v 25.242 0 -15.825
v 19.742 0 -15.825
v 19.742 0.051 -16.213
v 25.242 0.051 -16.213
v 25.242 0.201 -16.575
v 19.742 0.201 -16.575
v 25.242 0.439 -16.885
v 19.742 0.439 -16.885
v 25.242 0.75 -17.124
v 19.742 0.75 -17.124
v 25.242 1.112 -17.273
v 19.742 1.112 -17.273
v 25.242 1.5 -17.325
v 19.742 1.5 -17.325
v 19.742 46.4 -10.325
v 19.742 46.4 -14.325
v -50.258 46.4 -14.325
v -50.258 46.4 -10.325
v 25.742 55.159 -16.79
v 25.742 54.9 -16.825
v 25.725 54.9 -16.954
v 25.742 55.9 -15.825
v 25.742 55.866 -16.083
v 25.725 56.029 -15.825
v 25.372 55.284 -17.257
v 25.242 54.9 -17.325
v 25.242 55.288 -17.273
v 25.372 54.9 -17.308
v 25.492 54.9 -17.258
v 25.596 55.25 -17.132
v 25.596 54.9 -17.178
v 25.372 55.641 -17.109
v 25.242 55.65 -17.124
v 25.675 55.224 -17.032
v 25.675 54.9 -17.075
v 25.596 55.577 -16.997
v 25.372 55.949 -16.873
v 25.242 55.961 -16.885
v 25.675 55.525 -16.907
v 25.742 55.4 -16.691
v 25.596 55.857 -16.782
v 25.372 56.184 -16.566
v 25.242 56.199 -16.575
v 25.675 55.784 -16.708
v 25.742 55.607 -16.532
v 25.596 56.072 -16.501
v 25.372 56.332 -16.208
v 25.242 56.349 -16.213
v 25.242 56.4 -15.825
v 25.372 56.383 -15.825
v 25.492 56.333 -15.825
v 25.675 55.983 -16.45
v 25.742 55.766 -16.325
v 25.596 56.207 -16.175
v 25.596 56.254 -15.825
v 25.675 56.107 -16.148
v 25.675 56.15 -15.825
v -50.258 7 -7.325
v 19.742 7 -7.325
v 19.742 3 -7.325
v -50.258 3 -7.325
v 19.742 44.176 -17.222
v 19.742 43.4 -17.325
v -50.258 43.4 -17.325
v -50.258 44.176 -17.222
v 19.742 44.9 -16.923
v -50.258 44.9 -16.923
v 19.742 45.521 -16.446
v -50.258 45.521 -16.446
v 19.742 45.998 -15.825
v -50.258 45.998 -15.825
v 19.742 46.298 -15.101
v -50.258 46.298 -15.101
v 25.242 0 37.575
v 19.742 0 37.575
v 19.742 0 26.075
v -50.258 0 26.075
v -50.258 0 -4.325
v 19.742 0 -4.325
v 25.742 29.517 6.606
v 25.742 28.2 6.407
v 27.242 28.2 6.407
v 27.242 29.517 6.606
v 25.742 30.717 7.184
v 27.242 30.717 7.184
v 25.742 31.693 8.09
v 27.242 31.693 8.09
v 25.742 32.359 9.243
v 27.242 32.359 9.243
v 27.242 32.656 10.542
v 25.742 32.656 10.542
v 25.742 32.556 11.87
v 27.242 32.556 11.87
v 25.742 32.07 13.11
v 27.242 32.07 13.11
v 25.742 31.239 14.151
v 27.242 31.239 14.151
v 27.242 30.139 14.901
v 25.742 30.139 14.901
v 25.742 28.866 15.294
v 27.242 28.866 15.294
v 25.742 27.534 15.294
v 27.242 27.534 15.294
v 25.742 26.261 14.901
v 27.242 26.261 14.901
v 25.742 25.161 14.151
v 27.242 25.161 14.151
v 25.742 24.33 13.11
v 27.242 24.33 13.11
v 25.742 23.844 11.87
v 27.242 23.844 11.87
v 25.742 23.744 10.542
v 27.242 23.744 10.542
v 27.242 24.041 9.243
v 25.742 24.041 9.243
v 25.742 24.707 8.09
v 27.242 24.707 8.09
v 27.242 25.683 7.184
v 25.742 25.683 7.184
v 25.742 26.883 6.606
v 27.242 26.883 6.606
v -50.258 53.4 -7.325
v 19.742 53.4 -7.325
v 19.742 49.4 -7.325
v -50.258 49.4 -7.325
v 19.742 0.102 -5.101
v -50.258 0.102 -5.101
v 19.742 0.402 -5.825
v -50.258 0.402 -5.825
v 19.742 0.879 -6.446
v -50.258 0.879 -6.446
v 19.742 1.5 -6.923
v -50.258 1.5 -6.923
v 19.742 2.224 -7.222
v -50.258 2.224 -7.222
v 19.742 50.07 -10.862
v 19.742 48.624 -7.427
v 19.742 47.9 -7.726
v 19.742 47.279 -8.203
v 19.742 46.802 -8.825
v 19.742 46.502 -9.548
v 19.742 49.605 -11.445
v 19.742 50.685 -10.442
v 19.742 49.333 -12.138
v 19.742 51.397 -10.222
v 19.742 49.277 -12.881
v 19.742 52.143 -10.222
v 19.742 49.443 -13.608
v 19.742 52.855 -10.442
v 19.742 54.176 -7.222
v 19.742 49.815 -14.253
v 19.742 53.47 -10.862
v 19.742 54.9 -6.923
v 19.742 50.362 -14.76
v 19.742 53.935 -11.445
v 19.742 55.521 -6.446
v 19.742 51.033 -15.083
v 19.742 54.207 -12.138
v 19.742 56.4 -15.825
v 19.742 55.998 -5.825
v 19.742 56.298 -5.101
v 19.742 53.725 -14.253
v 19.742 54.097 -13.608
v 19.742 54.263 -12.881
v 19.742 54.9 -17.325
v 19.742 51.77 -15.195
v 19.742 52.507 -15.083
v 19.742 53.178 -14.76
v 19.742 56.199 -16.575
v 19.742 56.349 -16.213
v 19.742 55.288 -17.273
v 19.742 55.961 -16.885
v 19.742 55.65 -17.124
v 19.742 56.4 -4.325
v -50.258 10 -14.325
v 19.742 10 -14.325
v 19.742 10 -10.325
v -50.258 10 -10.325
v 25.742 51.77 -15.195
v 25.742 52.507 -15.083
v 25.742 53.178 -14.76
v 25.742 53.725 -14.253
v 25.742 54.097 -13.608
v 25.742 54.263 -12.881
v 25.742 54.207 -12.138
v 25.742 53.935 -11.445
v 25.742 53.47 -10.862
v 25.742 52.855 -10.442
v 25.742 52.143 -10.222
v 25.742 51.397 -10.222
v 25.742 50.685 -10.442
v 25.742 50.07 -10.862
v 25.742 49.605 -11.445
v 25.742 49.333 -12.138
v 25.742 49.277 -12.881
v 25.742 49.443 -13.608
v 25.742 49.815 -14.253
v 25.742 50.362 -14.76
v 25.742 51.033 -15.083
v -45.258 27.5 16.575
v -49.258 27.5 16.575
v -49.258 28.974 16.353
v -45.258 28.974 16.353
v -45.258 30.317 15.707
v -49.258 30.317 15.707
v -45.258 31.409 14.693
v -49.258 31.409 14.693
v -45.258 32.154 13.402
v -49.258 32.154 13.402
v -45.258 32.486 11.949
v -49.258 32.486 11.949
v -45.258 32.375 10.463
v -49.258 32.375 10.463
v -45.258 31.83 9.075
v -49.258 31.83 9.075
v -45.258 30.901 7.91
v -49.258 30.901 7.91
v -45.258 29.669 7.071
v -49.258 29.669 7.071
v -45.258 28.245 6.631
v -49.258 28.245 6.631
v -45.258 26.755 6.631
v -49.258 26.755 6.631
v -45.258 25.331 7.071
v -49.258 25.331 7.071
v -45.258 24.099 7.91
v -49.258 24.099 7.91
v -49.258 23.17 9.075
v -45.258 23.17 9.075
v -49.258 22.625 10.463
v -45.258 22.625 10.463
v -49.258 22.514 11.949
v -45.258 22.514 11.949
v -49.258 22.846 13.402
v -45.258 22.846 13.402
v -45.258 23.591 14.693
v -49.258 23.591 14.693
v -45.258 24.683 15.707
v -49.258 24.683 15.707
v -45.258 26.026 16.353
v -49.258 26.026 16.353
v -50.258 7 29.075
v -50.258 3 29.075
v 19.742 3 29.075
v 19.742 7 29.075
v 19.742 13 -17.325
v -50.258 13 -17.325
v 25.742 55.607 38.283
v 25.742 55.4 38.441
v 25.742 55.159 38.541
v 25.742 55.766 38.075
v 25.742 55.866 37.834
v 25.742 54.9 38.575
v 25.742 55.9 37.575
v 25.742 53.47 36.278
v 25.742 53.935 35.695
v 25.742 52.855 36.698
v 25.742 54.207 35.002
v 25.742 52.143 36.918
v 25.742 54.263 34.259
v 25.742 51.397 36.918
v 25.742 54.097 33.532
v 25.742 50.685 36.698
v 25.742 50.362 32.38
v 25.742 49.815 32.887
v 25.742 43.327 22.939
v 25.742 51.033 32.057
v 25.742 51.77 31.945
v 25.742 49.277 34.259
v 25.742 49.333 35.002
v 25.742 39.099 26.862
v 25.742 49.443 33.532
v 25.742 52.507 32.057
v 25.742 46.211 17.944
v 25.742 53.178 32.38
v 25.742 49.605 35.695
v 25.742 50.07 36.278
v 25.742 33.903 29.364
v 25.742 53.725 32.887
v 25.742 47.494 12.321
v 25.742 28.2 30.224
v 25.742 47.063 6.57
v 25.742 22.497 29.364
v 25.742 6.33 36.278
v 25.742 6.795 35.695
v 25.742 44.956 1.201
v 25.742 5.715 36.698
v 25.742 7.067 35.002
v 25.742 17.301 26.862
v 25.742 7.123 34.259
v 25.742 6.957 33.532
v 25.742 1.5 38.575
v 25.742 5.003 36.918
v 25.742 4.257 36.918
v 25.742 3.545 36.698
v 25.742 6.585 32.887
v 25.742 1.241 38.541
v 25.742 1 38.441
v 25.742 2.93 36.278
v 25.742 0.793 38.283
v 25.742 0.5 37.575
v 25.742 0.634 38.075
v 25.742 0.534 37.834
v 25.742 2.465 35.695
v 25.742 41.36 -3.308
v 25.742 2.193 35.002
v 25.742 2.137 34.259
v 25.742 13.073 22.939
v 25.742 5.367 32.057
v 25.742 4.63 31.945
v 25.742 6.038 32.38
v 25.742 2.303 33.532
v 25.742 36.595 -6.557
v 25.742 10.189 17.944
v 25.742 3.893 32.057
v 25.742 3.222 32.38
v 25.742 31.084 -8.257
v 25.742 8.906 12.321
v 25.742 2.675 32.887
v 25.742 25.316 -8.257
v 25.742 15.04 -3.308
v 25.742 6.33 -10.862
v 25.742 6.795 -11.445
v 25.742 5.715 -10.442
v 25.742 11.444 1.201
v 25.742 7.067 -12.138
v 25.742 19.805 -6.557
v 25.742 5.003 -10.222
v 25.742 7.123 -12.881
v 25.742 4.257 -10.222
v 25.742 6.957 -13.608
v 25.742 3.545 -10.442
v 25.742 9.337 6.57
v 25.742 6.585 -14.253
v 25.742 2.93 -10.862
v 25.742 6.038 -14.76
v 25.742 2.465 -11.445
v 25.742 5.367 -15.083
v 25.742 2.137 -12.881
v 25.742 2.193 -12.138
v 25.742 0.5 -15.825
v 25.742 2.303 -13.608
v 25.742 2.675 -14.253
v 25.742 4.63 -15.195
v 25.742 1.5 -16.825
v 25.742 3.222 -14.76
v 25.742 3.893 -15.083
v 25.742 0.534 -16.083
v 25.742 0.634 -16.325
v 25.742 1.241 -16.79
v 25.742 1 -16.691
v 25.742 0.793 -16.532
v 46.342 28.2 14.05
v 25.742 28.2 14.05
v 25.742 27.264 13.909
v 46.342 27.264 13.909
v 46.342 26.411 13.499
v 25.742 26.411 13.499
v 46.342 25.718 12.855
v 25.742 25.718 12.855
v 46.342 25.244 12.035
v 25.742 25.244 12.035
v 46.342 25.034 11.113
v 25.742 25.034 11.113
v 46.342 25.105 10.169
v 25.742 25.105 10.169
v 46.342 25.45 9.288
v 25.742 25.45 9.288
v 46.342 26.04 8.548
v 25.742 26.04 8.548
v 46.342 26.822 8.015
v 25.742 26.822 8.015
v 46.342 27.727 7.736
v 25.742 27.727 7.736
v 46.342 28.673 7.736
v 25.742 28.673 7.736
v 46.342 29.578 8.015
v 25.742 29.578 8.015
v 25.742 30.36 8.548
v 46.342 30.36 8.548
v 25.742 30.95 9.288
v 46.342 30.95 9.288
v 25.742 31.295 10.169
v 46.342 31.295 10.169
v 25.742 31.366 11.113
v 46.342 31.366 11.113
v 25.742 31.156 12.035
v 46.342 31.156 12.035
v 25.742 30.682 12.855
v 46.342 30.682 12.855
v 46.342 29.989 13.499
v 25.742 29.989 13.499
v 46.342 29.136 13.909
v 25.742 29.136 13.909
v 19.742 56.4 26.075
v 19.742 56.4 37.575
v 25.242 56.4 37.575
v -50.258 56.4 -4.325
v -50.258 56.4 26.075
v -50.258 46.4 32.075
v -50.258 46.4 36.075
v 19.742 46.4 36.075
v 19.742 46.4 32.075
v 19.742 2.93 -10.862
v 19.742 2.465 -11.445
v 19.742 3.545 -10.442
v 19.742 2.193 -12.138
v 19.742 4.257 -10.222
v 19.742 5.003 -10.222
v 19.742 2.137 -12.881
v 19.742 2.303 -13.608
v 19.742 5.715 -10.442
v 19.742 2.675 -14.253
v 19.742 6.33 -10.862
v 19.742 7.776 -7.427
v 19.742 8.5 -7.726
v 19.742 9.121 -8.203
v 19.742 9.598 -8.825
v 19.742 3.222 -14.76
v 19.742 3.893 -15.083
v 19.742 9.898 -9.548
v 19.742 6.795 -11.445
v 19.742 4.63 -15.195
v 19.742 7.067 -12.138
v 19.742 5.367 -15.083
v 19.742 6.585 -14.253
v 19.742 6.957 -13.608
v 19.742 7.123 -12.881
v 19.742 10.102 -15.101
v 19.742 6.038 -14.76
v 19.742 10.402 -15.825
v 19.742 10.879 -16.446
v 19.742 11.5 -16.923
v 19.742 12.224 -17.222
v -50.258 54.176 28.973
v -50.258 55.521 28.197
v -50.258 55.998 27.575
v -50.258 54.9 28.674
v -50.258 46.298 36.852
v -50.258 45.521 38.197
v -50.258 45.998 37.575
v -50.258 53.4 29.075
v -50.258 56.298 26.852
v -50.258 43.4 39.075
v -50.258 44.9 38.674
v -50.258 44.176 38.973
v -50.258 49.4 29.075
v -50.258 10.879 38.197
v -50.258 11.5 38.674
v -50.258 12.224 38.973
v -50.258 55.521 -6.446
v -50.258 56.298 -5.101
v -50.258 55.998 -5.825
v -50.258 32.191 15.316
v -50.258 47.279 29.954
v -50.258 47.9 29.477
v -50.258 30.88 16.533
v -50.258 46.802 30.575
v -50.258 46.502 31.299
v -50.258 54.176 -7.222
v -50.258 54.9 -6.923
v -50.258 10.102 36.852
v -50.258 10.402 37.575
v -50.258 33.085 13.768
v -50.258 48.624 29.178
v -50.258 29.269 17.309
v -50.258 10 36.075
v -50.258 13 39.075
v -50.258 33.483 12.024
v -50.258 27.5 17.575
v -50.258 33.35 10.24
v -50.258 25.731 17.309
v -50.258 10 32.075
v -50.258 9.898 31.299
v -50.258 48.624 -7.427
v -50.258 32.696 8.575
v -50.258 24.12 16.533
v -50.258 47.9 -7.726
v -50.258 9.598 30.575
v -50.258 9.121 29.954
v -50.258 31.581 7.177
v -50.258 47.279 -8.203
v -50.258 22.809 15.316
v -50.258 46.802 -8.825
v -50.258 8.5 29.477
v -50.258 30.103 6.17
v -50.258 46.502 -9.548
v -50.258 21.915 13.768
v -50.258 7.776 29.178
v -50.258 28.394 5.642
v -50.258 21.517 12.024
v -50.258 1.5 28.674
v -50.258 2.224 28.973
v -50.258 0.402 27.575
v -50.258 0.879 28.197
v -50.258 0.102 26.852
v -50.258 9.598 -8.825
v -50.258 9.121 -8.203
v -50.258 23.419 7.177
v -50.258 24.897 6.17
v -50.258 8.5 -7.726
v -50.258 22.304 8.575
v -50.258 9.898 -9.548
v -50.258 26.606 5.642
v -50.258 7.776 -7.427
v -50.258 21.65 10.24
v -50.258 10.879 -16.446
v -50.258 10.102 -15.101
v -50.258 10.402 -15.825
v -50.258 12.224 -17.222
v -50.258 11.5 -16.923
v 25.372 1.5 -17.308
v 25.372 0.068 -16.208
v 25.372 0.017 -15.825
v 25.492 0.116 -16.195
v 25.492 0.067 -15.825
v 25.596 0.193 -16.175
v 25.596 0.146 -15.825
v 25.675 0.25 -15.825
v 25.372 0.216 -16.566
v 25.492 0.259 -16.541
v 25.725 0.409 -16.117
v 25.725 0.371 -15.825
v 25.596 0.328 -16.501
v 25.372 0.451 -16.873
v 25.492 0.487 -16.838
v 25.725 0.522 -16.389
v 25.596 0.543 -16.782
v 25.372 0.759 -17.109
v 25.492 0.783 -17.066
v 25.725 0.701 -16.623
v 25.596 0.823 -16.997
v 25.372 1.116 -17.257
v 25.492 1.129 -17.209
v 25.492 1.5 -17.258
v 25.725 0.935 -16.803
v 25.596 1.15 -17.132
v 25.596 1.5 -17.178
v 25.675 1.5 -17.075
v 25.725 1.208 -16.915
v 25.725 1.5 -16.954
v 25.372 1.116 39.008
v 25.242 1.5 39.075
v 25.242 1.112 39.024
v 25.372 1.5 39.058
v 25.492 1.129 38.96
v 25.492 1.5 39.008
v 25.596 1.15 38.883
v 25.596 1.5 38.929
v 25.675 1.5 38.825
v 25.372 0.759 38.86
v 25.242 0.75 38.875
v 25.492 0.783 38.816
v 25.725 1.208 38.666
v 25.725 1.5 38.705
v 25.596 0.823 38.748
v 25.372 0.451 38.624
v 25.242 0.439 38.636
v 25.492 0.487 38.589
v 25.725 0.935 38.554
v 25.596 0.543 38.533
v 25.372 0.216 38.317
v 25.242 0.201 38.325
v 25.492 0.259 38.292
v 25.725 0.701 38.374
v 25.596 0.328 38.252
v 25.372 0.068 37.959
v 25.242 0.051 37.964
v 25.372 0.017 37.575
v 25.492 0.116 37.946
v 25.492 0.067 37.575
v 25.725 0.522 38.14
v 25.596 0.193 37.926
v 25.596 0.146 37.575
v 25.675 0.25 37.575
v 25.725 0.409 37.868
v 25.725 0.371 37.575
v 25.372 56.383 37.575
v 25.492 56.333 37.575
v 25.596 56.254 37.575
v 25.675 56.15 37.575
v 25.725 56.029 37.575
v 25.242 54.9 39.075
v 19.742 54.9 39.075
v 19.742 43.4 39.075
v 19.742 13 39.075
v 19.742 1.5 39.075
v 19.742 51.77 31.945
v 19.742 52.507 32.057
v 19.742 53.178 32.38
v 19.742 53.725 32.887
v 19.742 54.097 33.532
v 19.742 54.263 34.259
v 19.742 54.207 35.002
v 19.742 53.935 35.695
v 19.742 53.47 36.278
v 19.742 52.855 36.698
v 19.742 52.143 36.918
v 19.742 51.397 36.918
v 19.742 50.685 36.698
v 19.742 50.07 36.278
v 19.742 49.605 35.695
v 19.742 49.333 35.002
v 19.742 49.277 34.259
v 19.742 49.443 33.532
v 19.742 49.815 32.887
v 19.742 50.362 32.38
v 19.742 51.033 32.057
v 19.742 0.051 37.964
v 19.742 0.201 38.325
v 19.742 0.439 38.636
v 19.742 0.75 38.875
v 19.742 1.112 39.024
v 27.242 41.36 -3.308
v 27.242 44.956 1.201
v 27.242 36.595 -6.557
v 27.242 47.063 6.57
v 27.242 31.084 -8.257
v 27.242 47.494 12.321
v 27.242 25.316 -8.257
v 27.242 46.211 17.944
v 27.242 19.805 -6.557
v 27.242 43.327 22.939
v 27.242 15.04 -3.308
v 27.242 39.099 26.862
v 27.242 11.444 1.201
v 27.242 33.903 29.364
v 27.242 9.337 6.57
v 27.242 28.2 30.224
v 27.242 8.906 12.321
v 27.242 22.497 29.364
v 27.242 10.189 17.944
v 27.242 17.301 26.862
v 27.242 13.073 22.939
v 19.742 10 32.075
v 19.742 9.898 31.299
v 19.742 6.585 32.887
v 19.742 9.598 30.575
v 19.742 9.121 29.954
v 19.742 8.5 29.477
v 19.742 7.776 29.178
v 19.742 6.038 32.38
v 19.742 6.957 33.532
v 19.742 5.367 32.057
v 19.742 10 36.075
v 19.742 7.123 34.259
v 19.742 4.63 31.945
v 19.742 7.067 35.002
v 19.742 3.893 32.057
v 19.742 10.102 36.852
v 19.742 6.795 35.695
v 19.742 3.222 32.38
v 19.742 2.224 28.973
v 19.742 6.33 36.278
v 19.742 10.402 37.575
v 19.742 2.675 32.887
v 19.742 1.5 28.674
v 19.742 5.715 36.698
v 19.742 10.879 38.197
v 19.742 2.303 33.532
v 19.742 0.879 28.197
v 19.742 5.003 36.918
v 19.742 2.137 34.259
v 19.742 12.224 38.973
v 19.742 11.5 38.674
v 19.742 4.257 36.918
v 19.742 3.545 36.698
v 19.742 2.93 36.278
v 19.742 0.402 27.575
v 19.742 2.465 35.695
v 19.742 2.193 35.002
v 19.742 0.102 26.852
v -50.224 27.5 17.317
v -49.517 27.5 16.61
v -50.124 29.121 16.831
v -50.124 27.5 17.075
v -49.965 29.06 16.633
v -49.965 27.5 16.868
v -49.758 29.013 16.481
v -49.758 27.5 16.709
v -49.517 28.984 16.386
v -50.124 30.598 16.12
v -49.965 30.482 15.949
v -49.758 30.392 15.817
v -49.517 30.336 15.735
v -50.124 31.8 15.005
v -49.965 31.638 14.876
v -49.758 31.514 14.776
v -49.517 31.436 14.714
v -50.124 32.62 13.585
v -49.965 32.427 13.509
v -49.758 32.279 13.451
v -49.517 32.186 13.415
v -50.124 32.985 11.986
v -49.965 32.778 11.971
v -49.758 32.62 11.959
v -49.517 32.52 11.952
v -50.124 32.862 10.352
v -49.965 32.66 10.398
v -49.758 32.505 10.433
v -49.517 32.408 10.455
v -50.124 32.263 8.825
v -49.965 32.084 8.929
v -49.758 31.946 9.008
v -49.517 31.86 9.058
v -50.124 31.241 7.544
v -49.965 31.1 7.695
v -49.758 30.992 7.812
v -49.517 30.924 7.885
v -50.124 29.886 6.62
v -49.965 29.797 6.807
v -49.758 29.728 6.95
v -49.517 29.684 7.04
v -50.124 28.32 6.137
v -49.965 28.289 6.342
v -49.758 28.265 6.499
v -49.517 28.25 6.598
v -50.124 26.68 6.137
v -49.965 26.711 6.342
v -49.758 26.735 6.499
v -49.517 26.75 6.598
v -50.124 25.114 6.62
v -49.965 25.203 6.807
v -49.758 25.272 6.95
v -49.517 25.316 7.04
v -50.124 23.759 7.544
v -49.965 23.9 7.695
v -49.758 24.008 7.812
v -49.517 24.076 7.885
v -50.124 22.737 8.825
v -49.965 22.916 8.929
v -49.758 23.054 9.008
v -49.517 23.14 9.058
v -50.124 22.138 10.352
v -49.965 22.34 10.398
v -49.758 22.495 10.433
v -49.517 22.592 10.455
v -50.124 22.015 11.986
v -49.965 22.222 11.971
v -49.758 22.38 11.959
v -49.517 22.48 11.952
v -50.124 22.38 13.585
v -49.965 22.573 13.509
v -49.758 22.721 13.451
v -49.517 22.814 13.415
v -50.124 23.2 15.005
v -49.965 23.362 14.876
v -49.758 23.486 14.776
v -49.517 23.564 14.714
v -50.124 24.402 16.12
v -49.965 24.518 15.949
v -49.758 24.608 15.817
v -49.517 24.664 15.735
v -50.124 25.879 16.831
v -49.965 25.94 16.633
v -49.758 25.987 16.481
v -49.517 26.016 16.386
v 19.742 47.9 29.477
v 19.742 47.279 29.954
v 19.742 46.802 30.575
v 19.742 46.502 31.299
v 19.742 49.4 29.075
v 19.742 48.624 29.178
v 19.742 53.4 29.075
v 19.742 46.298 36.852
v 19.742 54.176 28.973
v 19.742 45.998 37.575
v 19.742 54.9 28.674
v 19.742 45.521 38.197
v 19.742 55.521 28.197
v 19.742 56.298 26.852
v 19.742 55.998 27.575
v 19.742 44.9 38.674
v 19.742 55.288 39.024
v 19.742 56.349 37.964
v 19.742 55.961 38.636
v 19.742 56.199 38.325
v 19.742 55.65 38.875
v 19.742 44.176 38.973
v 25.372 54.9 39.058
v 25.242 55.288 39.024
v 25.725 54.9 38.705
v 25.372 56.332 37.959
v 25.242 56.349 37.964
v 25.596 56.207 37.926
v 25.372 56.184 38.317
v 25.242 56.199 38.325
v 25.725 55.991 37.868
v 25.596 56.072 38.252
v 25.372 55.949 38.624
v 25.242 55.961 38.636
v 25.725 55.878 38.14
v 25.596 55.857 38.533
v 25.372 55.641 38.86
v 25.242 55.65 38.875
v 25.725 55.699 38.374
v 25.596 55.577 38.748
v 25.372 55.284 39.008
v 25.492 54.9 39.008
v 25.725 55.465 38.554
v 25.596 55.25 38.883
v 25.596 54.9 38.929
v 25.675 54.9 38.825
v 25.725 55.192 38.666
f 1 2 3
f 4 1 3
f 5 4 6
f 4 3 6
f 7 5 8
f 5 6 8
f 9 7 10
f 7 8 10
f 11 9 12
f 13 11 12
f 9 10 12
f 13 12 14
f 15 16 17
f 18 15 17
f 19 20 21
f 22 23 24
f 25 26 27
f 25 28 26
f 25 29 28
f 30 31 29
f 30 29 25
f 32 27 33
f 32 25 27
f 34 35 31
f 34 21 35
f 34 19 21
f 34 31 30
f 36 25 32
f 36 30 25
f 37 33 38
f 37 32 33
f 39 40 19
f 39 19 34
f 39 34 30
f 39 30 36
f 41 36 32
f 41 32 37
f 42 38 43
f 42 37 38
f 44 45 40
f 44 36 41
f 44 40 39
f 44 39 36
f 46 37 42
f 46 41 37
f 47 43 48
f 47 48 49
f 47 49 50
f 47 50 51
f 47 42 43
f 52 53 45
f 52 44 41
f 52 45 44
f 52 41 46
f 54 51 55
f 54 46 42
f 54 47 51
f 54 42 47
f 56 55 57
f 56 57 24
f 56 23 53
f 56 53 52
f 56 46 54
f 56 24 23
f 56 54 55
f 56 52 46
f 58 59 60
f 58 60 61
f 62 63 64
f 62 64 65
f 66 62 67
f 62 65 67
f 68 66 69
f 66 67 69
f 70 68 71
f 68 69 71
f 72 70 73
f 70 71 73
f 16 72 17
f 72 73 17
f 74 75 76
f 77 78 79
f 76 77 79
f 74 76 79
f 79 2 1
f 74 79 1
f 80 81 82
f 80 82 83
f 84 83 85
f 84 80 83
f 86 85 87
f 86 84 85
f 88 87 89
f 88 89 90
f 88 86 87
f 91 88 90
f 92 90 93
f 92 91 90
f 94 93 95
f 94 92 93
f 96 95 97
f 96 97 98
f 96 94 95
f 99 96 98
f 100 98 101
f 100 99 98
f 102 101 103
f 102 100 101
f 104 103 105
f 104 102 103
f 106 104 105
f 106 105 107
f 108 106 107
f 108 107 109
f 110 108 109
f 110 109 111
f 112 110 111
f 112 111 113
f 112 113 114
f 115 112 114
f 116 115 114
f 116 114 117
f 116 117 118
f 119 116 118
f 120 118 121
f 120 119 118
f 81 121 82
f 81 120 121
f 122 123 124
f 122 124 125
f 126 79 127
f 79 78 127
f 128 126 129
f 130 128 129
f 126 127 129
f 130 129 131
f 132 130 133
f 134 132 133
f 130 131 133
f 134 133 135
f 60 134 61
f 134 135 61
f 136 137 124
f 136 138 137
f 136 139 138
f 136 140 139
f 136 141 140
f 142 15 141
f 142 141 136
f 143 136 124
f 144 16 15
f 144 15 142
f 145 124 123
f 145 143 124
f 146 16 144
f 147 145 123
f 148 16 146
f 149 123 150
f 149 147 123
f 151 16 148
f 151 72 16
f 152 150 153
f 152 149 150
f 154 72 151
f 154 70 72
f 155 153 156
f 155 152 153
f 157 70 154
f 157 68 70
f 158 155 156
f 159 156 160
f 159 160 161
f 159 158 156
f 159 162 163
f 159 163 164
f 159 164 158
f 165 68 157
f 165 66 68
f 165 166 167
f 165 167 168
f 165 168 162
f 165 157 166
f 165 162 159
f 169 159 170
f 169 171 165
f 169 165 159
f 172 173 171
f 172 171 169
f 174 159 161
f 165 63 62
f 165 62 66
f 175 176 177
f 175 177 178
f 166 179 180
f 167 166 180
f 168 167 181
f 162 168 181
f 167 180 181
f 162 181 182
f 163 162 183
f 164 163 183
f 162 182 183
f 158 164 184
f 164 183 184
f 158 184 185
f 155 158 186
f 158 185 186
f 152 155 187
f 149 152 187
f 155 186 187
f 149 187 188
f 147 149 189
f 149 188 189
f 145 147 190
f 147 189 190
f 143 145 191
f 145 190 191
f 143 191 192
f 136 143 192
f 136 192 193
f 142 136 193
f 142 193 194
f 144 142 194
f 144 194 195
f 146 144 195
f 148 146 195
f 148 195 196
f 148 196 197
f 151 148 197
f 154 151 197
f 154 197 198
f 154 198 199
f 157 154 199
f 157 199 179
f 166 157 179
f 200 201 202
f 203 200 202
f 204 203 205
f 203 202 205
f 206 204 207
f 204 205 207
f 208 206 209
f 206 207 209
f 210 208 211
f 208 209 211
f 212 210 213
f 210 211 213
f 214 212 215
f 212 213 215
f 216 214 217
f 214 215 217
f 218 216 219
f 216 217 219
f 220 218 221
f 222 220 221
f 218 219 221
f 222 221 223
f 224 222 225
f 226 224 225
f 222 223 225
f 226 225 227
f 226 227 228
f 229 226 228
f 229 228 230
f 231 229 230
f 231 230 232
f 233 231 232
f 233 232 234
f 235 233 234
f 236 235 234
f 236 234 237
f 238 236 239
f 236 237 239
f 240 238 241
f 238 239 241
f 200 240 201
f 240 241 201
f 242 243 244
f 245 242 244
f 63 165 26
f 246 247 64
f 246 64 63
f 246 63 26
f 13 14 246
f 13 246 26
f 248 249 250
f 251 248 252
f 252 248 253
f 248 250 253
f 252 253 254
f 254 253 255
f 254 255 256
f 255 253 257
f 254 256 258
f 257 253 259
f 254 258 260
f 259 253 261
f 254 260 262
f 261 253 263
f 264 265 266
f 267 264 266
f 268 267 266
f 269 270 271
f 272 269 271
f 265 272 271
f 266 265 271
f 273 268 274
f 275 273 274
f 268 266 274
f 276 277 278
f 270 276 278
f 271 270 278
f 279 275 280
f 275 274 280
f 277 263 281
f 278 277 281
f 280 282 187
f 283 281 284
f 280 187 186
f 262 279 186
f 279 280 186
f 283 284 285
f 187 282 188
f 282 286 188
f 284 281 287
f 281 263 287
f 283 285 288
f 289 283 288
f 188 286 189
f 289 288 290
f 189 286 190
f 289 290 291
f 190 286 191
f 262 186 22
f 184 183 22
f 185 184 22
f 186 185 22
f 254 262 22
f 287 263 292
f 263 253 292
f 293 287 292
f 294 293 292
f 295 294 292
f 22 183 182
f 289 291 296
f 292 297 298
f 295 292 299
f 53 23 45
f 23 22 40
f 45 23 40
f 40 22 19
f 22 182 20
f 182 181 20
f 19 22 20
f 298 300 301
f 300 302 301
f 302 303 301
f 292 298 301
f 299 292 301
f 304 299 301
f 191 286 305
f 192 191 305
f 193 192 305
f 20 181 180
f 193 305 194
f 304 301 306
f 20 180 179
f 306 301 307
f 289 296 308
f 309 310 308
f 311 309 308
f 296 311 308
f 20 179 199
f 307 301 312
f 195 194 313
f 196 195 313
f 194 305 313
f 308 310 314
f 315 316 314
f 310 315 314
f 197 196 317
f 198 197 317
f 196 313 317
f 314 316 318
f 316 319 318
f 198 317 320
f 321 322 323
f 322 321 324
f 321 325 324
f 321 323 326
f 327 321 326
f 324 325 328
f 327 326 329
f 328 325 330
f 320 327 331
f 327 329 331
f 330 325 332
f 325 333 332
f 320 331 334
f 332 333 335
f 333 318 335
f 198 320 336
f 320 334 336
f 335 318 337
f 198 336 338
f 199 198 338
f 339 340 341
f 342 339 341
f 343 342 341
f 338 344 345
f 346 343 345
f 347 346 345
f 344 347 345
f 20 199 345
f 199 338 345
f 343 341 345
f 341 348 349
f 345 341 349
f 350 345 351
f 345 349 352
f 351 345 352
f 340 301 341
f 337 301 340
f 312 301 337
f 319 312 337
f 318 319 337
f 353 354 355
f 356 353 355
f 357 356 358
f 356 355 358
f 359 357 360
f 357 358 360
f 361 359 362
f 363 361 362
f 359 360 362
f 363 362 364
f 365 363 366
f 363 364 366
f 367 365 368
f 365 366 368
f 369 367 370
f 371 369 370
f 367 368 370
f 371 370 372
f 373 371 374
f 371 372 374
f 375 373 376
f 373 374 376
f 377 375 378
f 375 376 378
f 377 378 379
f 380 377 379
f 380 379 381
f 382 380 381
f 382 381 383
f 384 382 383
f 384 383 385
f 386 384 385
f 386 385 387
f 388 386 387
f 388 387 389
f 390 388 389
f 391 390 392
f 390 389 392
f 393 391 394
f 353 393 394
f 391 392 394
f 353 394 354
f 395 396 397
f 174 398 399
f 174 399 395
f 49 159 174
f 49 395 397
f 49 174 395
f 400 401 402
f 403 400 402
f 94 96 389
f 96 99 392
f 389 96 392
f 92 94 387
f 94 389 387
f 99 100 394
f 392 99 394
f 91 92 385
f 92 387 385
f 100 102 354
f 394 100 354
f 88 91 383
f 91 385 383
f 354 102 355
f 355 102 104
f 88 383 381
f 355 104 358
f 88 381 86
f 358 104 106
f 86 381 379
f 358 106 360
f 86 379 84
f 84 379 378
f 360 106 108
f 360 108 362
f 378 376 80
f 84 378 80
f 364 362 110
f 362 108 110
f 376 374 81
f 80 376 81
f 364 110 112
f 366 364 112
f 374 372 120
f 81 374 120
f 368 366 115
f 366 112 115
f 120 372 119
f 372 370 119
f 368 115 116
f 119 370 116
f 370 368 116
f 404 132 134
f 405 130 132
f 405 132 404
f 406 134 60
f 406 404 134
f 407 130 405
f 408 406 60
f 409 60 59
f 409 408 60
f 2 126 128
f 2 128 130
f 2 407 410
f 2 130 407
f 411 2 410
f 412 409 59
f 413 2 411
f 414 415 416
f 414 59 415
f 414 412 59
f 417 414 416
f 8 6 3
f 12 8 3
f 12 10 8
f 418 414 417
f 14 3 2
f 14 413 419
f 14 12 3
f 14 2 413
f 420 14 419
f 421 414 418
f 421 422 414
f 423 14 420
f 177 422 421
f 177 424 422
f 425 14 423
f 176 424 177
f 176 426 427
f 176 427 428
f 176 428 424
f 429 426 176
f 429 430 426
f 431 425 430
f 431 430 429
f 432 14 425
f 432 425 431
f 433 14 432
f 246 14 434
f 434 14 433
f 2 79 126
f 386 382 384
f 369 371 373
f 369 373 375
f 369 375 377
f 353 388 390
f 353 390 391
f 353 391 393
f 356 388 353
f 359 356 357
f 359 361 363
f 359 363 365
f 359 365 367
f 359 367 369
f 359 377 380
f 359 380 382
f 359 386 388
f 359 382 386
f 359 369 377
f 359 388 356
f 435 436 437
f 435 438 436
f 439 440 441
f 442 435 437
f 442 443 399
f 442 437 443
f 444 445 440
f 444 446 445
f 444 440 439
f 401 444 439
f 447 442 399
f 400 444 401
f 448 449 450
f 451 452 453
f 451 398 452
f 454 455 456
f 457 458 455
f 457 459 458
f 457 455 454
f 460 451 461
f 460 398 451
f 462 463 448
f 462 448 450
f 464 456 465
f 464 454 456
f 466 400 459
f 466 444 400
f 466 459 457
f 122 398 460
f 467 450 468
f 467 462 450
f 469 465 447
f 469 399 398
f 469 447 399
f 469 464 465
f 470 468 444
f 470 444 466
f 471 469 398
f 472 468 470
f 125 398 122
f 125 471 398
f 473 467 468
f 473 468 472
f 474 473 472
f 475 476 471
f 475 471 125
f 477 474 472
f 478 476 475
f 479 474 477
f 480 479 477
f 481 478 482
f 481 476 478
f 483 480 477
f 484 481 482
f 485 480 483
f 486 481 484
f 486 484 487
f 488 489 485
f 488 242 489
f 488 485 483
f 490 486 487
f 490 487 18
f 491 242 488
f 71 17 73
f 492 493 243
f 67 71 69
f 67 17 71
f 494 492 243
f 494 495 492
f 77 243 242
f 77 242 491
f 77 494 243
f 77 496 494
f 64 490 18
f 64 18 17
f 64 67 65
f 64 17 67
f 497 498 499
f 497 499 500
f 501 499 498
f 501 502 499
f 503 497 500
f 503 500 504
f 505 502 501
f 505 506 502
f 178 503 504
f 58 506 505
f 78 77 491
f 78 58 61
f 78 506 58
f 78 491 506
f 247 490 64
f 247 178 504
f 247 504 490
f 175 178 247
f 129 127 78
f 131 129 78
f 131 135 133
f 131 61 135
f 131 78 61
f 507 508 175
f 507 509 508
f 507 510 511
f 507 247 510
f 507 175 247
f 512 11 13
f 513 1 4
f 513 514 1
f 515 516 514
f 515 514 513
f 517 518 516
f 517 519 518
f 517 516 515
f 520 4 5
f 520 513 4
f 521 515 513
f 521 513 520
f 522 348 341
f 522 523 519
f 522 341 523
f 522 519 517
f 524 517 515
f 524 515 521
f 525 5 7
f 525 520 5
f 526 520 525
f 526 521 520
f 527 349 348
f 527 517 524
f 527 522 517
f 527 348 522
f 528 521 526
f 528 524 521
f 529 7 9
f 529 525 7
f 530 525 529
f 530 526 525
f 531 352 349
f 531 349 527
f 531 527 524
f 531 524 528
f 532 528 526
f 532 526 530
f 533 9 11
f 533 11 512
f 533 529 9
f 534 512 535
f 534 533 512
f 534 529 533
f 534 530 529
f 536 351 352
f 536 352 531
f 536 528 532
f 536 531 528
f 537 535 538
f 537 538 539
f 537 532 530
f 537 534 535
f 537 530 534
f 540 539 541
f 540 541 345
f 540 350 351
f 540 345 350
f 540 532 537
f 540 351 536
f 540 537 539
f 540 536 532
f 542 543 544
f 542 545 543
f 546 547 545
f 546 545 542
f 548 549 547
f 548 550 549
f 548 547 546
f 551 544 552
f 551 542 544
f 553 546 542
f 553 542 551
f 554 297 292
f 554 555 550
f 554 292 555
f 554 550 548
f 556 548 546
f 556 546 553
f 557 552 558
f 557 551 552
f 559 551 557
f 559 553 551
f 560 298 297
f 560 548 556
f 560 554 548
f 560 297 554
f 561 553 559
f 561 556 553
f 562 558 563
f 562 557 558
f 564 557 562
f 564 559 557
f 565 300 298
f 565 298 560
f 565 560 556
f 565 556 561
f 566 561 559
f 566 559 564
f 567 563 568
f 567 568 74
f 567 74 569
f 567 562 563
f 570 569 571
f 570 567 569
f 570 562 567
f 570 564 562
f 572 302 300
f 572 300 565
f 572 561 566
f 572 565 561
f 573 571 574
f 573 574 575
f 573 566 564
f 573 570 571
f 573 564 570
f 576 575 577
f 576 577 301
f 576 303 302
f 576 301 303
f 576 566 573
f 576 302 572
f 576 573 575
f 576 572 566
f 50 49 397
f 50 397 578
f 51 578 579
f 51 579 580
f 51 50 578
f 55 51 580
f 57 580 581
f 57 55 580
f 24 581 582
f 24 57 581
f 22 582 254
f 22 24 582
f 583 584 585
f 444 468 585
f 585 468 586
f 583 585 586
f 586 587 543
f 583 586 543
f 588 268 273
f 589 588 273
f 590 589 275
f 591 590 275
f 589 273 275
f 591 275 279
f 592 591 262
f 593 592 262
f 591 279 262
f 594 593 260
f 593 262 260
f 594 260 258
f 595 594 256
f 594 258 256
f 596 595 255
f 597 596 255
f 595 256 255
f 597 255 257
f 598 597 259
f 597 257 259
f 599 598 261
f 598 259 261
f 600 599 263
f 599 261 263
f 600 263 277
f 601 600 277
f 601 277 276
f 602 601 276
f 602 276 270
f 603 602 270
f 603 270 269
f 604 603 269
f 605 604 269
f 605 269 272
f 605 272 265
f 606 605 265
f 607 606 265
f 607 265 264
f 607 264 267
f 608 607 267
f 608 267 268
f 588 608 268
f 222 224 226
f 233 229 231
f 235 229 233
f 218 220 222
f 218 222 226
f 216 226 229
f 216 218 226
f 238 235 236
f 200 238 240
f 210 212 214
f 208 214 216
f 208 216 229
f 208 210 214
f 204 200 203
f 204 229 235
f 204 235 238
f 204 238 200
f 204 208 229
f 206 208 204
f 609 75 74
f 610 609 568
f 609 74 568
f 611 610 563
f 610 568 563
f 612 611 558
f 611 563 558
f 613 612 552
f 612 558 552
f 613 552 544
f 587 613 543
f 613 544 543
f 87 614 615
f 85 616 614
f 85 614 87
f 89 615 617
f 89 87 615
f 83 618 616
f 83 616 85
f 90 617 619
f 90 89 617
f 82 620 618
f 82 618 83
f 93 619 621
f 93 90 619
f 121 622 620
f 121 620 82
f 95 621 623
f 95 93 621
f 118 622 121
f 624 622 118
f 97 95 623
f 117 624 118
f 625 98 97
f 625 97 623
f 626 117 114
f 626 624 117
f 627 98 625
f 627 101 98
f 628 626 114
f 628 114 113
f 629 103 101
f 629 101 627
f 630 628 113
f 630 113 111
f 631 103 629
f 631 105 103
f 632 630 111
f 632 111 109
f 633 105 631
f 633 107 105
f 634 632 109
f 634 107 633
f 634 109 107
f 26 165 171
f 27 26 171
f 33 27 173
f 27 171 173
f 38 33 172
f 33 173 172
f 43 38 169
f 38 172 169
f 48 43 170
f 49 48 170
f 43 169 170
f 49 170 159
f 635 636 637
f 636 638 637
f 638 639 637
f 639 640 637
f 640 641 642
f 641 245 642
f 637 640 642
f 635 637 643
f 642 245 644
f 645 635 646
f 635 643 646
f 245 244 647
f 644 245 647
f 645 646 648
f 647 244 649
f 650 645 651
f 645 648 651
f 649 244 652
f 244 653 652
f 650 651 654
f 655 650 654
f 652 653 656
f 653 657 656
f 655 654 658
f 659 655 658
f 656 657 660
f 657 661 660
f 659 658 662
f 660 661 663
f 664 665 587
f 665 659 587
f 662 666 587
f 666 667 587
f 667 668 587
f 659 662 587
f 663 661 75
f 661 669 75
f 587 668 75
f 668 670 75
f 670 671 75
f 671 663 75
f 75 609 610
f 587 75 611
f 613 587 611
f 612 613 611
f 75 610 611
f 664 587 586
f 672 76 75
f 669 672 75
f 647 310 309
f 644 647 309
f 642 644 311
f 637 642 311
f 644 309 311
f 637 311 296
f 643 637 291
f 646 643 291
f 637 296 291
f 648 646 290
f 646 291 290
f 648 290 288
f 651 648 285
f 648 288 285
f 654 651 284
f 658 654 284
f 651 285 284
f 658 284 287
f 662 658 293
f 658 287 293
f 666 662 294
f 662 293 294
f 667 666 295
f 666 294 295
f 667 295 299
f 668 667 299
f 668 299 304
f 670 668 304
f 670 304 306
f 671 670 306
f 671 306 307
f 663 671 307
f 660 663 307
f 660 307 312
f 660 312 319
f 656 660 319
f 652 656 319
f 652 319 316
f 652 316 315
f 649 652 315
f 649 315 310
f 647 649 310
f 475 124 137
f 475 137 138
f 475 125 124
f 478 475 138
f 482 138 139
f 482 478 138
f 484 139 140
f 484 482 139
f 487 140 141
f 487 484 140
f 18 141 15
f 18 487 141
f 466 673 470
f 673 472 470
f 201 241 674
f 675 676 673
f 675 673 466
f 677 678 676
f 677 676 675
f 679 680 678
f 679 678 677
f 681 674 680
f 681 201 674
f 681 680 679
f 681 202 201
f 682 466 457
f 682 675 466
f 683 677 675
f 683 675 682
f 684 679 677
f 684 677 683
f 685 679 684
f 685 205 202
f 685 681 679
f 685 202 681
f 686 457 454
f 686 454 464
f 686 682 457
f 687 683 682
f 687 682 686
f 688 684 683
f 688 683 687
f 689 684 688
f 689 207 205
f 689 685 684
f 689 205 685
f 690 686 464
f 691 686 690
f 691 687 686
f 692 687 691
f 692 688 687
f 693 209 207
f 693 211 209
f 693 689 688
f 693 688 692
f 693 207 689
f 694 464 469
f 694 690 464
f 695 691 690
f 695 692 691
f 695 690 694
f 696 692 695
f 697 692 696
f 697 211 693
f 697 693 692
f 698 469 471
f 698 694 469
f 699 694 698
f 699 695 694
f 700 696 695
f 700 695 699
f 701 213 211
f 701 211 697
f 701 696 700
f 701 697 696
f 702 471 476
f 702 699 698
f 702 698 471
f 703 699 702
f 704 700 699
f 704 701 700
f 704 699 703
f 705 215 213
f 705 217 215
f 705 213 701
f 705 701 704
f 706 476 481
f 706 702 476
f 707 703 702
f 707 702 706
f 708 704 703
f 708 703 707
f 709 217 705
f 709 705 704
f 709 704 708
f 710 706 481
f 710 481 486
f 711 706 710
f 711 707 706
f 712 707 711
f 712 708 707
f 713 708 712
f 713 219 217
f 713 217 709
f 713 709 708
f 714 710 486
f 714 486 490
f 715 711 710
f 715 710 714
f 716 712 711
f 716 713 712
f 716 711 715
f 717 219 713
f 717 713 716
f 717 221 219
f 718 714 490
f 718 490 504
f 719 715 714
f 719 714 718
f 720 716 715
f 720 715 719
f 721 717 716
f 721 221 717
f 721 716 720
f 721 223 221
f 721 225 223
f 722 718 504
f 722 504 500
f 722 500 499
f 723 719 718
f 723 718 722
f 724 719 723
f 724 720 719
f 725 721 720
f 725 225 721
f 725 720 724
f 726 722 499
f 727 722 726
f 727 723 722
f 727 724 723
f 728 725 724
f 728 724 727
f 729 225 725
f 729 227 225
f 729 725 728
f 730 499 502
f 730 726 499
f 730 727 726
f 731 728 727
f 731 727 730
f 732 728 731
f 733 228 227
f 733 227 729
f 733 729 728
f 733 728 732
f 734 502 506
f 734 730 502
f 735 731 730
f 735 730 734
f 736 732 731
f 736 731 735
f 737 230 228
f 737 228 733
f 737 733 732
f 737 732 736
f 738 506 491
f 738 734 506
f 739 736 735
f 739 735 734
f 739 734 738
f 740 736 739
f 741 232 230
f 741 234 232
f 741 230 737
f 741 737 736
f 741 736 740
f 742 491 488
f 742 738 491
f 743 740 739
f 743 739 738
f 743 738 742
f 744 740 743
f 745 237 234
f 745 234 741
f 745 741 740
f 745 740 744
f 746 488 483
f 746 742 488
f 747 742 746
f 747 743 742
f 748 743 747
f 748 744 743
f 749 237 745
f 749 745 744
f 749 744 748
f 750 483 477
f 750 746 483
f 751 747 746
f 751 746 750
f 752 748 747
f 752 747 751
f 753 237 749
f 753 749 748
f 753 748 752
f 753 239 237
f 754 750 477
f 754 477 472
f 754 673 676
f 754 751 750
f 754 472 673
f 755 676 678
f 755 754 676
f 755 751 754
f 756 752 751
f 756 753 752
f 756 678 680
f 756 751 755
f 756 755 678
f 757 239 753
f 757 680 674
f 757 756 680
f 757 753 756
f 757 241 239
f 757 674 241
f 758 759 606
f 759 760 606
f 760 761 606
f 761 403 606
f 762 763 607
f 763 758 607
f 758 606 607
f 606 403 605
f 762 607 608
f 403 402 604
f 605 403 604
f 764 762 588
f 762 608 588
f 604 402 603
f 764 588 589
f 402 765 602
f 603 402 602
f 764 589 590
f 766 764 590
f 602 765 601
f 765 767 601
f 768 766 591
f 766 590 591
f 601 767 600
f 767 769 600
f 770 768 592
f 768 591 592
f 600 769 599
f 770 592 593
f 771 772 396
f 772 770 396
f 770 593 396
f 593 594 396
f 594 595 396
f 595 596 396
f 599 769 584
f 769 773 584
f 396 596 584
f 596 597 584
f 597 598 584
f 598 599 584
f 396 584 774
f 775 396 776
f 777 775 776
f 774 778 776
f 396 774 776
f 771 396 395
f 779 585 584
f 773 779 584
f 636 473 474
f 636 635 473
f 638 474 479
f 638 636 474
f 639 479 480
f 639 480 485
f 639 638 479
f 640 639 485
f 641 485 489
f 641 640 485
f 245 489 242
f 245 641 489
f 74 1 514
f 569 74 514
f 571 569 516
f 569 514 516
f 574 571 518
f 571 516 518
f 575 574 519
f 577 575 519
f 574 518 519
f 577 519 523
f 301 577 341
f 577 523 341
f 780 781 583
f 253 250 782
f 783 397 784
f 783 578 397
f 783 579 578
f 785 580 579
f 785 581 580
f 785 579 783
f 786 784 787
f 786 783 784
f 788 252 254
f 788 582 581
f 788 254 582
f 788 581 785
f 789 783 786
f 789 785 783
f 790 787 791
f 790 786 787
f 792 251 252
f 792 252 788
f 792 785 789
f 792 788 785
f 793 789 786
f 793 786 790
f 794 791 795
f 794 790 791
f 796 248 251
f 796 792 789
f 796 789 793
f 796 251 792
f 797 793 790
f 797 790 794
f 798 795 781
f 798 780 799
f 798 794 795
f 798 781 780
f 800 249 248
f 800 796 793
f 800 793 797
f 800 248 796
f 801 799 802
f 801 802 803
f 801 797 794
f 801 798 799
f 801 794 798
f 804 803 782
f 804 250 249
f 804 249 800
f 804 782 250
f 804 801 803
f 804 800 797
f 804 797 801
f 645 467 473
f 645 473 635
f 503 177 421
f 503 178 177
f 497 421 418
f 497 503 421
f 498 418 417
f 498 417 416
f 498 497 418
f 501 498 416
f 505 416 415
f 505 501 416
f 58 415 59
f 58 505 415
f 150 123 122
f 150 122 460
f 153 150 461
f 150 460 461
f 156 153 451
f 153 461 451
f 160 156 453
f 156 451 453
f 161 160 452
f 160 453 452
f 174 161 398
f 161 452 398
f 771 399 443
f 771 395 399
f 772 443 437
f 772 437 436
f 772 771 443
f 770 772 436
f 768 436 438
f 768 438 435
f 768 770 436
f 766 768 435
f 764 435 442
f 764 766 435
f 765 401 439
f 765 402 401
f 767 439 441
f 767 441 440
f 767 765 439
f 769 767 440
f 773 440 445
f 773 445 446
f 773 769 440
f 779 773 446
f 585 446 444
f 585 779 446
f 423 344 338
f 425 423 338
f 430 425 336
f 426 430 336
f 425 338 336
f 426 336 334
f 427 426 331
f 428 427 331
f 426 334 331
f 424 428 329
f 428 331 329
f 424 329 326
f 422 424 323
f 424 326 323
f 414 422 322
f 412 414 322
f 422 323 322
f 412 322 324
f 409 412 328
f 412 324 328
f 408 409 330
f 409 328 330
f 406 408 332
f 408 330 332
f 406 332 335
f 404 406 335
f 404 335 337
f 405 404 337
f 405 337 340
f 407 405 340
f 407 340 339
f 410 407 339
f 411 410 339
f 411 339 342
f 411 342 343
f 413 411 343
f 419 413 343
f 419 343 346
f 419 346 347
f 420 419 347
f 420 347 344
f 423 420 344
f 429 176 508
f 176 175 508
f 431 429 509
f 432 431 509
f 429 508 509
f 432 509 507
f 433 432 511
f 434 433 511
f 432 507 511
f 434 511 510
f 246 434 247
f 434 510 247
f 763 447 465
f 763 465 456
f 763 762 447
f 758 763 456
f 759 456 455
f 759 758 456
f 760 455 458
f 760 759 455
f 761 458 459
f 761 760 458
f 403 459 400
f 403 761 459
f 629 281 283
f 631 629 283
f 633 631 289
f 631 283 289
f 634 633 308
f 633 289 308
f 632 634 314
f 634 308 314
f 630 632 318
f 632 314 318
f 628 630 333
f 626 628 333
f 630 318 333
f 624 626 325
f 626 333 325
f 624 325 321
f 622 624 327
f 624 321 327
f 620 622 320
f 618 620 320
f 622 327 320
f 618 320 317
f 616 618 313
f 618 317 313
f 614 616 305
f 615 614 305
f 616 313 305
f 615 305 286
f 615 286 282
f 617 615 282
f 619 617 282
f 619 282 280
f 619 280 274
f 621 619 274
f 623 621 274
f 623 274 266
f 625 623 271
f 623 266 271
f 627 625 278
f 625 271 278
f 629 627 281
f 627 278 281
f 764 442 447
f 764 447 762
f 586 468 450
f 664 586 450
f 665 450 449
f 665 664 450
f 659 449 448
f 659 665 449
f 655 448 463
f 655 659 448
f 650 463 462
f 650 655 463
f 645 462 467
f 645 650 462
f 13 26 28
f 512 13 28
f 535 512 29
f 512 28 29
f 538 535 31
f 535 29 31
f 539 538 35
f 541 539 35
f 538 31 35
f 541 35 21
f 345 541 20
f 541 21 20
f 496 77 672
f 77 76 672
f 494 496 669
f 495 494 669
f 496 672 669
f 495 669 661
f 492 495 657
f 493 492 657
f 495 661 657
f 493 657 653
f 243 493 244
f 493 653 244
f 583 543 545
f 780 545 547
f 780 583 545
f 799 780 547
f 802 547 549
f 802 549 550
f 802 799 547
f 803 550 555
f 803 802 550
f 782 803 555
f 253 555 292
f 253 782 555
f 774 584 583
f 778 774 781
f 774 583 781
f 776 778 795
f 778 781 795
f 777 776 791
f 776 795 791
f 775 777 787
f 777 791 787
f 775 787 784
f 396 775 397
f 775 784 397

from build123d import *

# Parameters (mm, degrees)
SKETCH1_W           = 76
SKETCH1_H           = 56.4
BOSS_EXTRUDE1_DEPTH = 56.4
SKETCH2_W           = 70
SKETCH2_H           = 10
CUT_EXTRUDE1_DEPTH  = 10
SKETCH3_W           = 70
SKETCH3_H           = 10
CUT_EXTRUDE4_DEPTH  = 10
SKETCH5_W           = 70
SKETCH5_H           = 10
CUT_EXTRUDE5_DEPTH  = 10
FILLET2_R           = 3
FILLET3_R           = 3
SKETCH7_R           = 5
CUT_EXTRUDE6_DEPTH  = 5
FILLET4_R           = 1
FILLET5_R           = 0.5
FILLET6_R           = 1.5
FILLET7_R           = 1.5
SKETCH18_R          = 2.5
CUT_EXTRUDE7_DEPTH  = 10
SKETCH20_R          = 3.175
BOSS_EXTRUDE2_DEPTH = 20.6
SKETCH21_R          = 19.348505468
SKETCH21_R_2        = 4.468295999
BOSS_EXTRUDE3_DEPTH = 1.5


with BuildPart() as part:
    # Sketch1 → Boss-Extrude1 (new body)
    with BuildSketch(Plane(origin=(0, 0, 0), x_dir=(1, 0, 0), z_dir=(0, 1, 0))):
        with Locations((-12.257828935, -10.875461997)):
            Rectangle(SKETCH1_W, SKETCH1_H)
    extrude(amount=BOSS_EXTRUDE1_DEPTH)

    # Sketch2 → Cut-Extrude1 (cut)
    with BuildSketch(Plane.XY.offset(39.075461997)):
        with Locations((-15.257828935, 51.4)):
            Rectangle(SKETCH2_W, SKETCH2_H)
    extrude(amount=-CUT_EXTRUDE1_DEPTH, mode=Mode.SUBTRACT)

    # Sketch3 → Cut-Extrude4 (cut)
    with BuildSketch(Plane(origin=(0, 0, -17.324538003), x_dir=(-1, 0, 0), z_dir=(0, 0, -1))):
        with Locations((15.257828935, 51.4)):
            Rectangle(SKETCH3_W, SKETCH3_H)
        with Locations((15.257828935, 5)):
            Rectangle(SKETCH3_W, SKETCH3_H)
    extrude(amount=-CUT_EXTRUDE4_DEPTH, mode=Mode.SUBTRACT)

    # Sketch5 → Cut-Extrude5 (cut)
    with BuildSketch(Plane.XZ):
        with Locations((-15.257828935, 34.075461997)):
            Rectangle(SKETCH5_W, SKETCH5_H)
    extrude(amount=-CUT_EXTRUDE5_DEPTH, mode=Mode.SUBTRACT)

    # Fillet2
    fillet2_edges = [part.edges().sort_by_distance(p)[0] for p in [
        (-15.257828935, 56.4, 29.075461997),
        (-15.257828935, 46.4, 39.075461997),
        (-15.257828935, 0, -7.324538003),
        (-15.257828935, 10, -17.324538003),
        (-15.257828935, 56.4, -7.324538003),
        (-15.257828935, 46.4, -17.324538003),
        (-15.257828935, 10, 39.075461997),
        (-15.257828935, 0, 29.075461997),
    ]]
    fillet(fillet2_edges, radius=FILLET2_R)

    # Fillet3
    fillet3_edges = [part.edges().sort_by_distance(p)[0] for p in [
        (-15.257828935, 46.4, 29.075461997),
        (-15.257828935, 10, -7.324538003),
        (-15.257828935, 46.4, -7.324538003),
        (-15.257828935, 10, 29.075461997),
    ]]
    fillet(fillet3_edges, radius=FILLET3_R)

    # Sketch7 → Cut-Extrude6 (cut)
    with BuildSketch(Plane.ZY.offset(50.257828935)):
        with Locations((11.575461997, 27.5)):
            Circle(SKETCH7_R)
    extrude(amount=-CUT_EXTRUDE6_DEPTH, mode=Mode.SUBTRACT)

    # Fillet4
    fillet4_edges = [part.edges().sort_by_distance(p)[0] for p in [
        (-50.257828935, 27.5, 6.575461997),
    ]]
    fillet(fillet4_edges, radius=FILLET4_R)

    # Fillet5
    fillet5_edges = [part.edges().sort_by_distance(p)[0] for p in [
        (25.742171065, 56.4, 10.875461997),
        (25.742171065, 0, 10.875461997),
        (25.742171065, 28.2, -17.324538003),
        (25.742171065, 28.2, 39.075461997),
    ]]
    fillet(fillet5_edges, radius=FILLET5_R)

    # Fillet6
    # the kernel refuses this fillet: 1.5 mm, written as the material it takes off along each edge
    with BuildSketch(Plane(origin=(25.742171065, 54.9, 37.575461997), x_dir=(0, 1, 0), z_dir=(0, 0, -1))) as fillet6_piece_1:
        with BuildLine():
            CenterArc((1, -0.5), 0.5, 0, 90)
            Line((1.5, -0.5), (1.5, 0))
            Line((1.5, 0), (1, 0))
        make_face()
    revolve(axis=Axis((25.742171065, 54.9, 37.575461997), (1, 0, 0)), revolution_arc=90, mode=Mode.SUBTRACT)
    with BuildSketch(Plane(origin=(25.742171065, 56.4, 39.075461997), x_dir=(0, -1, 0), z_dir=(-1, 0, 0))) as fillet6_piece_2:
        with BuildLine():
            CenterArc((FILLET6_R, -FILLET6_R), FILLET6_R, 90, 90)
            Line((0, -FILLET6_R), (0, 0))
            Line((0, 0), (FILLET6_R, 0))
        make_face()
    extrude(amount=9.75, mode=Mode.SUBTRACT)

    # Fillet7
    # the kernel refuses this fillet: 1.5 mm, written as the material it takes off along each edge
    with BuildSketch(Plane(origin=(25.742171065, 1.5, 37.575461997), x_dir=(0, 0, 1), z_dir=(0, 1, 0))) as fillet7_piece_1:
        with BuildLine():
            CenterArc((1, -0.5), 0.5, 0, 90)
            Line((1.5, -0.5), (1.5, 0))
            Line((1.5, 0), (1, 0))
        make_face()
    revolve(axis=Axis((25.742171065, 1.5, 37.575461997), (1, 0, 0)), revolution_arc=90, mode=Mode.SUBTRACT)
    with BuildSketch(Plane(origin=(25.742171065, 54.9, -15.824538003), x_dir=(0, 0, -1), z_dir=(0, -1, 0))) as fillet7_piece_2:
        with BuildLine():
            CenterArc((1, -0.5), 0.5, 0, 90)
            Line((1.5, -0.5), (1.5, 0))
            Line((1.5, 0), (1, 0))
        make_face()
    revolve(axis=Axis((25.742171065, 54.9, -15.824538003), (1, 0, 0)), revolution_arc=90, mode=Mode.SUBTRACT)
    with BuildSketch(Plane(origin=(25.742171065, 1.5, -15.824538003), x_dir=(0, -1, 0), z_dir=(0, 0, 1))) as fillet7_piece_3:
        with BuildLine():
            CenterArc((1, -0.5), 0.5, 0, 90)
            Line((1.5, -0.5), (1.5, 0))
            Line((1.5, 0), (1, 0))
        make_face()
    revolve(axis=Axis((25.742171065, 1.5, -15.824538003), (1, 0, 0)), revolution_arc=90, mode=Mode.SUBTRACT)
    with BuildSketch(Plane(origin=(15.992171065, 56.4, -17.324538003), x_dir=(0, -1, 0), z_dir=(1, 0, 0)), Plane(origin=(15.992171065, 0, -17.324538003), x_dir=(0, 0, 1), z_dir=(1, 0, 0)), Plane(origin=(25.742171065, 0, 39.075461997), x_dir=(0, 0, -1), z_dir=(-1, 0, 0))) as fillet7_piece_4:
        with BuildLine():
            CenterArc((FILLET7_R, -FILLET7_R), FILLET7_R, 90, 90)
            Line((0, -FILLET7_R), (0, 0))
            Line((0, 0), (FILLET7_R, 0))
        make_face()
    extrude(amount=9.75, mode=Mode.SUBTRACT)

    # Sketch18 → Cut-Extrude7 (cut)
    with BuildSketch(Plane(origin=(25.742171065, 0, 0), x_dir=(0, 0, -1), z_dir=(1, 0, 0))):
        with Locations((-34.445461997, 51.77)):
            Circle(SKETCH18_R)
        with Locations((12.694538003, 51.77)):
            Circle(SKETCH18_R)
        with Locations((12.694538003, 4.63)):
            Circle(SKETCH18_R)
        with Locations((-34.445461997, 4.63)):
            Circle(SKETCH18_R)
    extrude(amount=-CUT_EXTRUDE7_DEPTH, mode=Mode.SUBTRACT)

    # Sketch20 → Boss-Extrude2 (add)
    with BuildSketch(Plane(origin=(25.742171065, 0, 0), x_dir=(0, 0, -1), z_dir=(1, 0, 0))):
        with Locations(Location((-10.875461997, 28.2, 0), (0, 0, 180))):
            Circle(SKETCH20_R)
    extrude(amount=BOSS_EXTRUDE2_DEPTH)

    # Sketch21 → Boss-Extrude3 (add)
    with BuildSketch(Plane(origin=(25.742171065, 0, 0), x_dir=(0, 0, -1), z_dir=(1, 0, 0))):
        with Locations(Location((-10.875461997, 28.2, 0), (0, 0, 180))):
            Circle(SKETCH21_R)
        with Locations((-10.875461997, 28.2)):
            Circle(SKETCH21_R_2, mode=Mode.SUBTRACT)
    extrude(amount=BOSS_EXTRUDE3_DEPTH)


solid = part.part
